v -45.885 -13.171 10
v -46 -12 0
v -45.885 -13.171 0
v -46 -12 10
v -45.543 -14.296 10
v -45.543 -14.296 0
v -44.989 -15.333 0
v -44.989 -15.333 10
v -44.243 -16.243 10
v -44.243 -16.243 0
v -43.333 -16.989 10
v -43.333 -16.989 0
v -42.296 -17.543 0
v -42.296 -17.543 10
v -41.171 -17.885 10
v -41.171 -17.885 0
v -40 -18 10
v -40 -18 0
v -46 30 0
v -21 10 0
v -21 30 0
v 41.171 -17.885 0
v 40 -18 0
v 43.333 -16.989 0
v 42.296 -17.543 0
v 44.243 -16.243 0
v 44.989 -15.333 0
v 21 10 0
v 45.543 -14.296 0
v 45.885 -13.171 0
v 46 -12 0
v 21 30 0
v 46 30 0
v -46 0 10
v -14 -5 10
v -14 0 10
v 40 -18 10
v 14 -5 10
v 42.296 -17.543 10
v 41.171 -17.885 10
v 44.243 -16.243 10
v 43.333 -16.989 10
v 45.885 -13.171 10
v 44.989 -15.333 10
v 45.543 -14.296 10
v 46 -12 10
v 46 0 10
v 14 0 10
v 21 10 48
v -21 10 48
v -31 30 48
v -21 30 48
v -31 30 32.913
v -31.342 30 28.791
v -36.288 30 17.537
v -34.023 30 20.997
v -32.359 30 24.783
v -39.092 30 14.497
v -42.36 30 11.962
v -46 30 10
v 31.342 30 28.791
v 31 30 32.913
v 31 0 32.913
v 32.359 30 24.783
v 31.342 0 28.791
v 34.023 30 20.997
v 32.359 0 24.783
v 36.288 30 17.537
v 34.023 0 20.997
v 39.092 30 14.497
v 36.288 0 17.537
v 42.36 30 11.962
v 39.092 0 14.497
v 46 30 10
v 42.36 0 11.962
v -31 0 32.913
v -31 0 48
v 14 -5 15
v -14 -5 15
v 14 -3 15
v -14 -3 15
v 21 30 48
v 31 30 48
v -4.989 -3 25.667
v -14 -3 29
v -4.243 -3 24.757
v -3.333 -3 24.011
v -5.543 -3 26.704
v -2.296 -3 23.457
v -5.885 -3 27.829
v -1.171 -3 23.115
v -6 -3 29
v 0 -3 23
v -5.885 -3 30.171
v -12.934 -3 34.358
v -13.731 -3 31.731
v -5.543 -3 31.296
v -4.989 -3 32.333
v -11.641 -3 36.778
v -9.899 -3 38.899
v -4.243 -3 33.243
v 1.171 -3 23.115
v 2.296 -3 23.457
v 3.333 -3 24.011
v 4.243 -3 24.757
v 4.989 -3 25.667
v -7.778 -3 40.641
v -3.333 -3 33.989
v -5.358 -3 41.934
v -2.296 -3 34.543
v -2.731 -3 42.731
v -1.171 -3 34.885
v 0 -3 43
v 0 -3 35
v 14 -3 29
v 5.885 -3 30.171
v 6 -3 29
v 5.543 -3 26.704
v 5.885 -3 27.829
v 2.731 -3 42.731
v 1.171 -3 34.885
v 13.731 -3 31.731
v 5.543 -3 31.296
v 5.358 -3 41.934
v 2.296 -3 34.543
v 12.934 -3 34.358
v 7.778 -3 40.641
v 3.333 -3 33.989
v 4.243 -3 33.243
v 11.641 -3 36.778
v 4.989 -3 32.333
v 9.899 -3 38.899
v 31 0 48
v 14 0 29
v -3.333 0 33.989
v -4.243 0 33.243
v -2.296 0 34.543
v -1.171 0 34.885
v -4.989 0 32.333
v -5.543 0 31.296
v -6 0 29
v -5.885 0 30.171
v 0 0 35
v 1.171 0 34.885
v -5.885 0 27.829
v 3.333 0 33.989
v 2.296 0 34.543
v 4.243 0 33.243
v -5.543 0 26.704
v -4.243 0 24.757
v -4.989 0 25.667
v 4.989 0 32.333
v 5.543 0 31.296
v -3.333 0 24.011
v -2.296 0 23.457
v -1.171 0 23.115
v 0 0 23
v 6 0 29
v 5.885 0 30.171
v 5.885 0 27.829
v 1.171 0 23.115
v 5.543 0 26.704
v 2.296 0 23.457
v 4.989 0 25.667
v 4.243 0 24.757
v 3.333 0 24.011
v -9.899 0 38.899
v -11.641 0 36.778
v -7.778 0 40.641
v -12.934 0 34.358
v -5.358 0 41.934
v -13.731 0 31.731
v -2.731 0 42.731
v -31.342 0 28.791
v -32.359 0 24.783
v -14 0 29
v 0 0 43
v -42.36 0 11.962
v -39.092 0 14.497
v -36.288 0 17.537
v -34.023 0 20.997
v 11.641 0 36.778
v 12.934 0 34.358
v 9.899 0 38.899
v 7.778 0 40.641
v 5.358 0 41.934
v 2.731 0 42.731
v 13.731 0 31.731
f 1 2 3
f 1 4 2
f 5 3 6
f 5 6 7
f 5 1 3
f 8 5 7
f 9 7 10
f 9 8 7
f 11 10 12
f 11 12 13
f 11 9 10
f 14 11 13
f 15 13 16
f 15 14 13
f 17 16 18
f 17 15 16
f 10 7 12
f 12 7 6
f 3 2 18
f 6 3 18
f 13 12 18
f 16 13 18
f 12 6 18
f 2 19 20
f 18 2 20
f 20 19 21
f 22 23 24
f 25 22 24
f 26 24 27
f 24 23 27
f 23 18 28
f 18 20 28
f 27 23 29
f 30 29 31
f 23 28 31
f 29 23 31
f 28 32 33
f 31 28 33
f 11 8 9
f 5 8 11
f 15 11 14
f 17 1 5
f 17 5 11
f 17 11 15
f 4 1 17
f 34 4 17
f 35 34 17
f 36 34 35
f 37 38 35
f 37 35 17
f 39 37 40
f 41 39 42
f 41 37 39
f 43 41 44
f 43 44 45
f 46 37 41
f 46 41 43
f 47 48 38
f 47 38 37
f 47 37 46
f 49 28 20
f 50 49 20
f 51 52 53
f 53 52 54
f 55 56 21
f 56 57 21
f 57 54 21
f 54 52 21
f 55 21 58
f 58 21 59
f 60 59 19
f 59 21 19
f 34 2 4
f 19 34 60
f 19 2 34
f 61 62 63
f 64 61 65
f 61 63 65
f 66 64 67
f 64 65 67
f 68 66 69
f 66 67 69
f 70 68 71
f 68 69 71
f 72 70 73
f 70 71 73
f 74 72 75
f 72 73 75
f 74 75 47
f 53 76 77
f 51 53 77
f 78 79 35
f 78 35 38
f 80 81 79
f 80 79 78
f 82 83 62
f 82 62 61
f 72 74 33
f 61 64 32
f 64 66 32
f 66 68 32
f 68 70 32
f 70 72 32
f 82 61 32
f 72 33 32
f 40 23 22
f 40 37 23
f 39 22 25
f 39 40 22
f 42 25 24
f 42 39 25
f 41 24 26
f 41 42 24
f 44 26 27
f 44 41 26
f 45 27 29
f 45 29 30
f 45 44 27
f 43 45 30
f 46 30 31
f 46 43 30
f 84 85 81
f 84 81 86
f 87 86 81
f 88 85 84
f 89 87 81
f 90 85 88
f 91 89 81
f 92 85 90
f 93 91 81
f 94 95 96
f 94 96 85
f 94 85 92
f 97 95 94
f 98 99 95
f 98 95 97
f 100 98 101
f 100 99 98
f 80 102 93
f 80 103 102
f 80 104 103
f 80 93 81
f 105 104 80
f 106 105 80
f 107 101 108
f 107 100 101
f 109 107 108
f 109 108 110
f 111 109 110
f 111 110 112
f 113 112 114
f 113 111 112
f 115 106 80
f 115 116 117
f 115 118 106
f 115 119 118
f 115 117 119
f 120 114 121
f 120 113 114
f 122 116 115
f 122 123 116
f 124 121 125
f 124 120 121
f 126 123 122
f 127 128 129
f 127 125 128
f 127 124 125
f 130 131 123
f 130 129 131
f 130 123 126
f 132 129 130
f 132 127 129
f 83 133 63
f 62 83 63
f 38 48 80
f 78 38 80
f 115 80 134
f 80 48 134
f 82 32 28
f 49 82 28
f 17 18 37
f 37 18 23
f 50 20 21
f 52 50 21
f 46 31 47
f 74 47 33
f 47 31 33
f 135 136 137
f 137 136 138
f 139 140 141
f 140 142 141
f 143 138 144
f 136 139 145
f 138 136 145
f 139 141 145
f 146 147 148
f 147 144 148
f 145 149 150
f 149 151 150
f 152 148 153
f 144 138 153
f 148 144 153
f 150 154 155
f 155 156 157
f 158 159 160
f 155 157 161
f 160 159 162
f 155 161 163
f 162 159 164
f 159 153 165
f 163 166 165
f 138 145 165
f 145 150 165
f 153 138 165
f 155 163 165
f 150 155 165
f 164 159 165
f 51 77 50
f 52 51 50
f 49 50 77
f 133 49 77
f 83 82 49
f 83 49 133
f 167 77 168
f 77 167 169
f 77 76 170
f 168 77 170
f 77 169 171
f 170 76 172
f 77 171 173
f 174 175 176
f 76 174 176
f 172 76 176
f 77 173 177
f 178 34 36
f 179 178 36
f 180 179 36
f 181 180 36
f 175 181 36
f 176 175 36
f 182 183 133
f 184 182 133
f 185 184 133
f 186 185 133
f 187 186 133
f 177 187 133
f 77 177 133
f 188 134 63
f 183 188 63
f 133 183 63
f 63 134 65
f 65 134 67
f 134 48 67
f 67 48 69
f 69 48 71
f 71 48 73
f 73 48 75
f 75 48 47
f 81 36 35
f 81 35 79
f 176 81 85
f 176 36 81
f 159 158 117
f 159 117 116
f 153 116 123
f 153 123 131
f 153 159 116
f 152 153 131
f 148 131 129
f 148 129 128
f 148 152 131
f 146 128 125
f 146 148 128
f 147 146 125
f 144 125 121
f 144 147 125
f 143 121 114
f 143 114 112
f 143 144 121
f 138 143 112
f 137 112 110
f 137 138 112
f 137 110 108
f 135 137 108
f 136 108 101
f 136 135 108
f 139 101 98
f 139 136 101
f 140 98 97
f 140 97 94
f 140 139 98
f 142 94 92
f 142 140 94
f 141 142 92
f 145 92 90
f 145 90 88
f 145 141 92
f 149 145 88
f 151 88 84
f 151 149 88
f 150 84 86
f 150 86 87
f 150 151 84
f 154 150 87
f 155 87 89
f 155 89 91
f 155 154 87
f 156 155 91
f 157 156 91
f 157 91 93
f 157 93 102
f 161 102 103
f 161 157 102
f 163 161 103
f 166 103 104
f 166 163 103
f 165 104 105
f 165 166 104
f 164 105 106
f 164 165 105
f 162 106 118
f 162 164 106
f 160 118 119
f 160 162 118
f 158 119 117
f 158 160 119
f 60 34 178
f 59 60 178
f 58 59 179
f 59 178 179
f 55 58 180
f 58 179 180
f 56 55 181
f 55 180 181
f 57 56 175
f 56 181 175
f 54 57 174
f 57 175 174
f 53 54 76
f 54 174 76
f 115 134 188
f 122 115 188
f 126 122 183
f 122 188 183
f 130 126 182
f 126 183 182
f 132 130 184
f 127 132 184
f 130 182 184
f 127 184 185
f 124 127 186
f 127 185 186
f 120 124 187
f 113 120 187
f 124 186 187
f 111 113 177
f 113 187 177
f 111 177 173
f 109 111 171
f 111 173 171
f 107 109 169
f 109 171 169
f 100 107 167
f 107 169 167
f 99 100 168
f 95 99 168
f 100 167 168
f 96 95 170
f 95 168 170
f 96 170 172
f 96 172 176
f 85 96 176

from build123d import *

# Parameters (mm, degrees)
F1_DEPTH = 48
F0_W     = 92
F0_H     = 18
F2_DEPTH = 10
F4_DEPTH = 42.2
F5_R     = 6
F6_DEPTH = 3
F5_W     = 28
F5_H     = 5
F7_DEPTH = 5
F8_R     = 6


with BuildPart() as f1:
    # F0 (on Top) → F1 (new body)
    with BuildSketch(Plane.XY):
        Polygon((-21, 30), (-46, 30), (-46, 0), (46, 0), (46, 30), (21, 30), (21, 10), (-21, 10), align=None)
    extrude(amount=F1_DEPTH)

    # F0 (on Top) → F2 (join)
    with BuildSketch(Plane.XY):
        with Locations((0, -9)):
            Rectangle(F0_W, F0_H)
    extrude(amount=F2_DEPTH)

    # F3 (on Front) → F4 (cut)
    with BuildSketch(Plane.XZ):
        with BuildLine():
            Line((-31, 32.9128784748), (-31, 56.0039258774))
            Line((-31, 56.0039258774), (-46.4185841416, 56.0039258774))
            ThreePointArc((-46.4185841416, 56.0039258774), (-35.208951488, 46.7956844509), (-31, 32.9128784748))
        make_face()
        with BuildLine():
            ThreePointArc((-46.4185841416, 56.0039258774), (-76.791048512, 19.0300724987), (-31, 32.9128784748))
            ThreePointArc((-31, 32.9128784748), (-35.208951488, 46.7956844509), (-46.4185841416, 56.0039258774))
        make_face()
        with BuildLine():
            ThreePointArc((81, 32.9128784748), (69.8828059761, 53.7039269868), (46.4185841416, 56.0039258774))
            ThreePointArc((46.4185841416, 56.0039258774), (35.208951488, 46.7956844509), (31, 32.9128784748))
            ThreePointArc((31, 32.9128784748), (56, 7.9128784748), (81, 32.9128784748))
        make_face()
        with BuildLine():
            ThreePointArc((31, 32.9128784748), (35.208951488, 46.7956844509), (46.4185841416, 56.0039258774))
            Line((46.4185841416, 56.0039258774), (31, 56.0039258774))
            Line((31, 56.0039258774), (31, 32.9128784748))
        make_face()
    extrude(amount=-F4_DEPTH, mode=Mode.SUBTRACT)

    # F5 (on face) → F6 (join)
    with BuildSketch(Plane.XZ):
        with BuildLine():
            Line((14, 15), (14, 29))
            ThreePointArc((14, 29), (0, 43), (-14, 29))
            Line((-14, 29), (-14, 15))
            Line((-14, 15), (14, 15))
        make_face()
        with Locations((0, 29)):
            Circle(F5_R, mode=Mode.SUBTRACT)
    extrude(amount=F6_DEPTH)

    # F5 (on face) → F7 (join)
    with BuildSketch(Plane.XZ):
        with Locations((0, 12.5)):
            Rectangle(F5_W, F5_H)
    extrude(amount=F7_DEPTH)

    # F8
    f8_edges = [f1.edges().sort_by_distance(p)[0] for p in [
        (-46, -18, 5),
        (46, -18, 5),
    ]]
    fillet(f8_edges, radius=F8_R)


solid = f1.part
